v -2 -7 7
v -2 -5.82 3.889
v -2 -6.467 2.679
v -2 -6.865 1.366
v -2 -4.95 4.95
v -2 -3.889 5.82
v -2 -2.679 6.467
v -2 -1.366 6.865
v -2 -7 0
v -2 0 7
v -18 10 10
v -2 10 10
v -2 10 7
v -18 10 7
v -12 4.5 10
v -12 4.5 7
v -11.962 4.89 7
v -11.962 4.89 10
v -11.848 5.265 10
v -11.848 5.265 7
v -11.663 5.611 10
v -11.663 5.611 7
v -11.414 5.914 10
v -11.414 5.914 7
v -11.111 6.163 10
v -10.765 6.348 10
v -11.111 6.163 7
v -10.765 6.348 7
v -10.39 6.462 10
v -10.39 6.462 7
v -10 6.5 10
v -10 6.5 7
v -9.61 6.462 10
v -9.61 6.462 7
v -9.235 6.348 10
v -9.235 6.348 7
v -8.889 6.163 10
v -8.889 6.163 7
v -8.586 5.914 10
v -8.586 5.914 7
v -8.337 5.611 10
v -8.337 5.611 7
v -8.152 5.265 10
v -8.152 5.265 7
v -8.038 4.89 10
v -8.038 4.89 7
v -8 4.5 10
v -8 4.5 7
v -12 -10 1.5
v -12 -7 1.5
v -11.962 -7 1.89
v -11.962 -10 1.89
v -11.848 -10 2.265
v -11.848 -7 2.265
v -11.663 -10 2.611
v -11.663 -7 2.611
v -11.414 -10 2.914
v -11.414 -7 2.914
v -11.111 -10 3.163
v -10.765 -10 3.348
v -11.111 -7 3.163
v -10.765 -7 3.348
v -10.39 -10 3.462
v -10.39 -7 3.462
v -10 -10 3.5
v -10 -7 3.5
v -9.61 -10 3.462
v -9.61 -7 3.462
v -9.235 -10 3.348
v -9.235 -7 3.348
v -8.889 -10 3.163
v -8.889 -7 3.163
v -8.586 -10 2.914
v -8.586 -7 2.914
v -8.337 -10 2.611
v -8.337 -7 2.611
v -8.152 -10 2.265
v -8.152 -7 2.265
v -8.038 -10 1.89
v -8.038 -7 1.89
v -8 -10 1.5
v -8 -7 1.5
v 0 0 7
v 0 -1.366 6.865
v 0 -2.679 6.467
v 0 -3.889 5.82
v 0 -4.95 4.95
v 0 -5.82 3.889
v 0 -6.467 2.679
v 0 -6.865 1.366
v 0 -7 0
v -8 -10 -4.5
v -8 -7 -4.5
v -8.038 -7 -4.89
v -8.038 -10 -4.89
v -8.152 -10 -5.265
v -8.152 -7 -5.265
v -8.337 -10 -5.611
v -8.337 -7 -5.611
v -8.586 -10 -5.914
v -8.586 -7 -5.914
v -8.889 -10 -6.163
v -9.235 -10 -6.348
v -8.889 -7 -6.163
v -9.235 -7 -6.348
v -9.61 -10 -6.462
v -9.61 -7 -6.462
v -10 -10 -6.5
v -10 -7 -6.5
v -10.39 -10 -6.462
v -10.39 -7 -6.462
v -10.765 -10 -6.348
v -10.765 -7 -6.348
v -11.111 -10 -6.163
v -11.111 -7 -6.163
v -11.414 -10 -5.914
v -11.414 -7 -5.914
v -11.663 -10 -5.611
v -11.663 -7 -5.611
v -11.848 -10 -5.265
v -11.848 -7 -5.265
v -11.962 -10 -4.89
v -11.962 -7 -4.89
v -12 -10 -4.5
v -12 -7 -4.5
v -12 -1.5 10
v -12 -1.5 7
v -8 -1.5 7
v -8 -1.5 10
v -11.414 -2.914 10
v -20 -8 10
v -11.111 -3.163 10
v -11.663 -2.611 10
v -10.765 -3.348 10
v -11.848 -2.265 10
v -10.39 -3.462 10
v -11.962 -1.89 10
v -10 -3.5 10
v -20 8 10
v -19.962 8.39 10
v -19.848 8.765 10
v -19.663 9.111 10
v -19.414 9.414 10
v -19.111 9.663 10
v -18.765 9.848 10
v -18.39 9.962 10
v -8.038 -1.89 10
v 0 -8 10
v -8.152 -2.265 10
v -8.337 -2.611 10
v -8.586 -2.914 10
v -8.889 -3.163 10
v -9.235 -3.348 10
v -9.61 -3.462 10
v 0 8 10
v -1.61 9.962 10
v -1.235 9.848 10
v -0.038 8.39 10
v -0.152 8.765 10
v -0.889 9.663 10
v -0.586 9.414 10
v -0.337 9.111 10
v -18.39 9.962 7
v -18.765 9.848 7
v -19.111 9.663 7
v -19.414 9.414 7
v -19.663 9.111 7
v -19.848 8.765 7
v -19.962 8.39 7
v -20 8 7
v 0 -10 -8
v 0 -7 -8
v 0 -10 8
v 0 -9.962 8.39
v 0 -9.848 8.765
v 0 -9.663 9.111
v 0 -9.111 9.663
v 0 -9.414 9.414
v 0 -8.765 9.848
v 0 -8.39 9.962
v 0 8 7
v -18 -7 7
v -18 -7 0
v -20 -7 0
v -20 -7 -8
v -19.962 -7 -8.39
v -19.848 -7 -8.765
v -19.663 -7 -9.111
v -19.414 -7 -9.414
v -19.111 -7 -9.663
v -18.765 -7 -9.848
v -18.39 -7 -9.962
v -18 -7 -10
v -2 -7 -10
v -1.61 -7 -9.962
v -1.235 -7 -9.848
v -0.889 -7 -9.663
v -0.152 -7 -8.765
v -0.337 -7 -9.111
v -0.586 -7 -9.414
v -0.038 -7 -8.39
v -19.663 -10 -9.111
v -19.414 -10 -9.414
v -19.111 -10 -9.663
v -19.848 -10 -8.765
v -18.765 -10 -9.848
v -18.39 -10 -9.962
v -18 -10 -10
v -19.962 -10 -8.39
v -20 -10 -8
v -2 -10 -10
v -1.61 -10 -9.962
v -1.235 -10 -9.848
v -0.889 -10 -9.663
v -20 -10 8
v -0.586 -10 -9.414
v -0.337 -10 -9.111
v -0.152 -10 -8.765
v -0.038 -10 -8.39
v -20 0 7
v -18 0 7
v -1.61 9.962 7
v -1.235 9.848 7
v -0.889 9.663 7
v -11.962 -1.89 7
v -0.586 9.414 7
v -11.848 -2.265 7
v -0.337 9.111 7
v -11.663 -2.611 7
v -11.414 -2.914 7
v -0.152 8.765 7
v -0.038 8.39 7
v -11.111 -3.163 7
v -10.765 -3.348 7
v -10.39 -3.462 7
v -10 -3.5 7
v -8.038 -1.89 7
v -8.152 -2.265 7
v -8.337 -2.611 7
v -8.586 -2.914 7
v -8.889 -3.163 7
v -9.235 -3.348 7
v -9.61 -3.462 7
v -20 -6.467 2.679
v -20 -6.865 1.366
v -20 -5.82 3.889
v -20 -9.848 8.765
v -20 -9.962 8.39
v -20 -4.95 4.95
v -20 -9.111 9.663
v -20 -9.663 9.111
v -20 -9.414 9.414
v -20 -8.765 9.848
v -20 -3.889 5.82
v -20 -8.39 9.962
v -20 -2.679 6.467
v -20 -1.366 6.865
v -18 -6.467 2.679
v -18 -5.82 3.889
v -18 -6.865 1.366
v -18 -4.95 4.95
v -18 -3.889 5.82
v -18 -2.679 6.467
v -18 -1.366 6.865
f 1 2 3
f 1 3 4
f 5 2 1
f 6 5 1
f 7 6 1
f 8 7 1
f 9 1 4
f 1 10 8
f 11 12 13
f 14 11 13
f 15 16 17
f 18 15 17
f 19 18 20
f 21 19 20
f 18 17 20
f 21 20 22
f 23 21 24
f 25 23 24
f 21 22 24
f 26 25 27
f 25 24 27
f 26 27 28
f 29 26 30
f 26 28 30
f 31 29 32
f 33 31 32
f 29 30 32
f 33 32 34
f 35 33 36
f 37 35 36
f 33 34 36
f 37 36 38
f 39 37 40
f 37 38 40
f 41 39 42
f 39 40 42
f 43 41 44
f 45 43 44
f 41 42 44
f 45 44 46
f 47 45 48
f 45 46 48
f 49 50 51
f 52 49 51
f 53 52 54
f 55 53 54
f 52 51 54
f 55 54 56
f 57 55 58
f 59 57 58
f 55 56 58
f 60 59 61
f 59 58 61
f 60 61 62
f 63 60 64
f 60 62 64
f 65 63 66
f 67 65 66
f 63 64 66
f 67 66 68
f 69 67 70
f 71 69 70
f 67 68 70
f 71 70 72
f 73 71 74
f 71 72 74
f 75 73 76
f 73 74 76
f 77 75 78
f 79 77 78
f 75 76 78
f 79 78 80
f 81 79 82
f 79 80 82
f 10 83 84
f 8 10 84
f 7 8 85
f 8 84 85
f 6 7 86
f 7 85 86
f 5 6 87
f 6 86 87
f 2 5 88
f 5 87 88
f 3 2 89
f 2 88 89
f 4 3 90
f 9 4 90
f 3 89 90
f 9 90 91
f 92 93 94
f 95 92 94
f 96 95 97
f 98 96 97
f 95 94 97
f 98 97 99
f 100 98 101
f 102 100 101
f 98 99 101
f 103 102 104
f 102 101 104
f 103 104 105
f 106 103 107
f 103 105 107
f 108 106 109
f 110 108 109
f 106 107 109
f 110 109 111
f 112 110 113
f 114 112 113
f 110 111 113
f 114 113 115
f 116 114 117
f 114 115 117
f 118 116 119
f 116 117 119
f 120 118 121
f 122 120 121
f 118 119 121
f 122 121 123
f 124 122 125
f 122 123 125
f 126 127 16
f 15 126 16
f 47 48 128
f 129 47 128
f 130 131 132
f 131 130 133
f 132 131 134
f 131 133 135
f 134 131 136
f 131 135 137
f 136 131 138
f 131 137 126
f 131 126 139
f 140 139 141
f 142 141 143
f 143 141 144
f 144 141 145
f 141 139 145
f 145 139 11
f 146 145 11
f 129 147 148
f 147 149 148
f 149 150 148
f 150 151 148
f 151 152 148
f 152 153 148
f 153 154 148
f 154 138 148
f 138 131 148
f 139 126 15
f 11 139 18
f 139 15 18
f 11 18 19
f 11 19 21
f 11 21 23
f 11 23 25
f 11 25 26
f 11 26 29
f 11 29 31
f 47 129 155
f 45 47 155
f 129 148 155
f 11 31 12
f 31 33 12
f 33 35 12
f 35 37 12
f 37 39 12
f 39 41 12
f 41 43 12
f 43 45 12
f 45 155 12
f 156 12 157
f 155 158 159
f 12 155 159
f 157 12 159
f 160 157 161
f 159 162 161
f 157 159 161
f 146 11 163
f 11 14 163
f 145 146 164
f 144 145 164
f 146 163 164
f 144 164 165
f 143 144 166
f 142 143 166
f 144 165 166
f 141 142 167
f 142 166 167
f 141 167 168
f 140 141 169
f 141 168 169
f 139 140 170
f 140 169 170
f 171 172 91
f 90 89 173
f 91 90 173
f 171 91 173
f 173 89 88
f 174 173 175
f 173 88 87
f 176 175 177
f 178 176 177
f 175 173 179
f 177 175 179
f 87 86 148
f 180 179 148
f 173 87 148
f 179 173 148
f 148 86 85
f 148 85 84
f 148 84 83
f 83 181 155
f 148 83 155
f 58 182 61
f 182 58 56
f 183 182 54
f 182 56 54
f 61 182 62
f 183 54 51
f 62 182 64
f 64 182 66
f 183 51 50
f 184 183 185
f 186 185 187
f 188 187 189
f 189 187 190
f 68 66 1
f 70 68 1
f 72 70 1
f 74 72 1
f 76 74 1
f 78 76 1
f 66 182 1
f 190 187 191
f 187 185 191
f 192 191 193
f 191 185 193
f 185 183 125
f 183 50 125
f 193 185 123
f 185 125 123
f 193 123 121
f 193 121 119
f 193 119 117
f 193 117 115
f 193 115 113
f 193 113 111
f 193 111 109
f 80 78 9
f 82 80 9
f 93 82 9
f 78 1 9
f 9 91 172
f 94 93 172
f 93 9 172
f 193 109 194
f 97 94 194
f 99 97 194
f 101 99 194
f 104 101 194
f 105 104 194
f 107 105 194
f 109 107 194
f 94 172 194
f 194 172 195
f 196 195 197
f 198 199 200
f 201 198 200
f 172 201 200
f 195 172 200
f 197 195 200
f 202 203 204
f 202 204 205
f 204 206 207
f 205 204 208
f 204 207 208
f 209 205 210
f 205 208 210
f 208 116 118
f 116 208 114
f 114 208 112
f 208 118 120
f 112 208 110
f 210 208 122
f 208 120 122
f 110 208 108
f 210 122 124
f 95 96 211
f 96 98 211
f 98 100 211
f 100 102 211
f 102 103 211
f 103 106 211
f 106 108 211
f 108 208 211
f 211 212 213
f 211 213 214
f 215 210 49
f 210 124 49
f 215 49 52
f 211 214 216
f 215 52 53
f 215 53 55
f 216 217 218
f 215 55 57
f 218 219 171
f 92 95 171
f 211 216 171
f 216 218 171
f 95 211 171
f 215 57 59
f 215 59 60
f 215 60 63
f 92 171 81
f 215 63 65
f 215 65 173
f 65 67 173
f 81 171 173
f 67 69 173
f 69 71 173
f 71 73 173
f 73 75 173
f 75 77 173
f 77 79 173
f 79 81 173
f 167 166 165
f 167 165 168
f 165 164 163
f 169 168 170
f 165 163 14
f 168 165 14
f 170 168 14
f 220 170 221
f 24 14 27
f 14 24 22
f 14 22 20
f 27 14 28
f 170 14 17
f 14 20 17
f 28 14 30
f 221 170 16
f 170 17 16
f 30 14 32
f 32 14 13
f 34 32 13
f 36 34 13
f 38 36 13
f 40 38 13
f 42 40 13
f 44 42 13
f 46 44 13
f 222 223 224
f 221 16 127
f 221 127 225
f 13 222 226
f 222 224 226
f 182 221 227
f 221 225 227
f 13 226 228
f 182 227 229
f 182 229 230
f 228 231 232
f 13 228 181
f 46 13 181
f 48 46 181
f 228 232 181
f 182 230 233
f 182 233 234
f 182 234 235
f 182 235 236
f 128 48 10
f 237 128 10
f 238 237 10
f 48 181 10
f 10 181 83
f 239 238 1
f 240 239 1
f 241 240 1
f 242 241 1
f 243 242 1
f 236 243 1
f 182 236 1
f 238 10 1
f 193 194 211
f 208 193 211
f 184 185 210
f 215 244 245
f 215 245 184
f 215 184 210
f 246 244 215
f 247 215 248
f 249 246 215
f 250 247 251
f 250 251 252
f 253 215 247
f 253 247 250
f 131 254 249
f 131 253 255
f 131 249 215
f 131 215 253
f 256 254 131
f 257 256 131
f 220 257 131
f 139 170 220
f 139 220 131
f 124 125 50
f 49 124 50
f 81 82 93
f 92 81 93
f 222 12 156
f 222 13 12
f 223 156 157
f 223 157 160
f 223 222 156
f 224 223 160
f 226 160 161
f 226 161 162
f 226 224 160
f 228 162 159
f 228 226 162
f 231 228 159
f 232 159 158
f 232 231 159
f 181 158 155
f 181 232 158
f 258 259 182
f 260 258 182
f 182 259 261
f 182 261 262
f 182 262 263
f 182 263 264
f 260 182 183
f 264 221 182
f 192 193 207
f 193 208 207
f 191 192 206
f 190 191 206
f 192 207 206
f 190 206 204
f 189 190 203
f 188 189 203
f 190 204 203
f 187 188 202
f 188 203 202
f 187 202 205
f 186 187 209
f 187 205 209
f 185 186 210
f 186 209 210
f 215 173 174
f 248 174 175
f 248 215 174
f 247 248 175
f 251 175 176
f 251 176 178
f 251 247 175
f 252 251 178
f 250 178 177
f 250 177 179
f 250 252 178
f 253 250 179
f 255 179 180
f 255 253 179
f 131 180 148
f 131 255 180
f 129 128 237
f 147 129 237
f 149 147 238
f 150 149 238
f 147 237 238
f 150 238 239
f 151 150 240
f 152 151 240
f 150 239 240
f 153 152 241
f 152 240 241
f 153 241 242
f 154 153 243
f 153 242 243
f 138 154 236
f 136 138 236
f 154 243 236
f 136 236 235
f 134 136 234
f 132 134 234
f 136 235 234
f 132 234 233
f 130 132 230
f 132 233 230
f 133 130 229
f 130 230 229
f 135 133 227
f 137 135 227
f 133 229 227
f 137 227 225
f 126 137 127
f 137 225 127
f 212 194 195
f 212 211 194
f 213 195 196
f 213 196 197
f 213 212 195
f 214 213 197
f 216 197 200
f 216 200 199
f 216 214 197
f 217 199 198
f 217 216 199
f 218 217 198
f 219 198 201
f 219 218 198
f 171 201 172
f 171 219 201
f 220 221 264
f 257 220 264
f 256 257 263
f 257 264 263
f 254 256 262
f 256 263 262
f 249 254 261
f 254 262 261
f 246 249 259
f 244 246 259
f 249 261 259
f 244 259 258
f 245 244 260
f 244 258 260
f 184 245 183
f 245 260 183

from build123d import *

# Parameters (mm, degrees)
EXTRUDE_1_DEPTH     = 20
FILLET_1_R          = 2
SKETCH_2_W          = 7
SKETCH_2_H          = 7
CUT_EXTRUDE_1_DEPTH = 8
CUT_EXTRUDE_4_DEPTH = 29.08914381
CUT_EXTRUDE_5_DEPTH = 29.08914381


with BuildPart() as part:
    # 草图1 → 凸台-拉伸1 (new body)
    with BuildSketch(Plane(origin=(0, 0, 0), x_dir=(0, 0, -1), z_dir=(1, 0, 0))):
        with BuildLine():
            Line((-7, 10), (-7, 0))
            ThreePointArc((-7, 0), (-4.949747468, -4.949747468), (0, -7))
            Line((0, -7), (10, -7))
            Line((10, -7), (10, -10))
            Line((10, -10), (-10, -10))
            Line((-10, -10), (-10, 10))
            Line((-10, 10), (-7, 10))
        make_face()
    extrude(amount=-EXTRUDE_1_DEPTH)

    # 圆角1
    fillet_1_edges = [part.edges().sort_by_distance(p)[0] for p in [
        (-10, -10, 10),
        (-20, -8.5, -10),
        (0, -8.5, -10),
        (-20, 10, 8.5),
        (0, 10, 8.5),
    ]]
    fillet(fillet_1_edges, radius=FILLET_1_R)

    # 草图2 → 切除-拉伸1 (cut, symmetric)
    with BuildSketch(Plane.ZY.offset(10)):
        with Locations((3.5, -3.5)):
            Rectangle(SKETCH_2_W, SKETCH_2_H)
    extrude(amount=CUT_EXTRUDE_1_DEPTH, both=True, mode=Mode.SUBTRACT)

    # 草图3 → 切除-拉伸4 (cut, through all)
    with BuildSketch(Plane(origin=(0, -7, 0), x_dir=(1, 0, 0), z_dir=(0, 1, 0))):
        with BuildLine():
            Line((-12, 4.5), (-12, -1.5))
            ThreePointArc((-12, -1.5), (-10, -3.5), (-8, -1.5))
            Line((-8, -1.5), (-8, 4.5))
            ThreePointArc((-8, 4.5), (-10, 6.5), (-12, 4.5))
        make_face()
    extrude(amount=-CUT_EXTRUDE_4_DEPTH, mode=Mode.SUBTRACT)

    # 草图6 → 切除-拉伸5 (cut, through all)
    with BuildSketch(Plane(origin=(0, 0, 7), x_dir=(-1, 0, 0), z_dir=(0, 0, -1))):
        with BuildLine():
            Line((8, 4.5), (8, -1.5))
            ThreePointArc((8, -1.5), (10, -3.5), (12, -1.5))
            Line((12, -1.5), (12, 4.5))
            ThreePointArc((12, 4.5), (10, 6.5), (8, 4.5))
        make_face()
    extrude(amount=-CUT_EXTRUDE_5_DEPTH, mode=Mode.SUBTRACT)


solid = part.part
